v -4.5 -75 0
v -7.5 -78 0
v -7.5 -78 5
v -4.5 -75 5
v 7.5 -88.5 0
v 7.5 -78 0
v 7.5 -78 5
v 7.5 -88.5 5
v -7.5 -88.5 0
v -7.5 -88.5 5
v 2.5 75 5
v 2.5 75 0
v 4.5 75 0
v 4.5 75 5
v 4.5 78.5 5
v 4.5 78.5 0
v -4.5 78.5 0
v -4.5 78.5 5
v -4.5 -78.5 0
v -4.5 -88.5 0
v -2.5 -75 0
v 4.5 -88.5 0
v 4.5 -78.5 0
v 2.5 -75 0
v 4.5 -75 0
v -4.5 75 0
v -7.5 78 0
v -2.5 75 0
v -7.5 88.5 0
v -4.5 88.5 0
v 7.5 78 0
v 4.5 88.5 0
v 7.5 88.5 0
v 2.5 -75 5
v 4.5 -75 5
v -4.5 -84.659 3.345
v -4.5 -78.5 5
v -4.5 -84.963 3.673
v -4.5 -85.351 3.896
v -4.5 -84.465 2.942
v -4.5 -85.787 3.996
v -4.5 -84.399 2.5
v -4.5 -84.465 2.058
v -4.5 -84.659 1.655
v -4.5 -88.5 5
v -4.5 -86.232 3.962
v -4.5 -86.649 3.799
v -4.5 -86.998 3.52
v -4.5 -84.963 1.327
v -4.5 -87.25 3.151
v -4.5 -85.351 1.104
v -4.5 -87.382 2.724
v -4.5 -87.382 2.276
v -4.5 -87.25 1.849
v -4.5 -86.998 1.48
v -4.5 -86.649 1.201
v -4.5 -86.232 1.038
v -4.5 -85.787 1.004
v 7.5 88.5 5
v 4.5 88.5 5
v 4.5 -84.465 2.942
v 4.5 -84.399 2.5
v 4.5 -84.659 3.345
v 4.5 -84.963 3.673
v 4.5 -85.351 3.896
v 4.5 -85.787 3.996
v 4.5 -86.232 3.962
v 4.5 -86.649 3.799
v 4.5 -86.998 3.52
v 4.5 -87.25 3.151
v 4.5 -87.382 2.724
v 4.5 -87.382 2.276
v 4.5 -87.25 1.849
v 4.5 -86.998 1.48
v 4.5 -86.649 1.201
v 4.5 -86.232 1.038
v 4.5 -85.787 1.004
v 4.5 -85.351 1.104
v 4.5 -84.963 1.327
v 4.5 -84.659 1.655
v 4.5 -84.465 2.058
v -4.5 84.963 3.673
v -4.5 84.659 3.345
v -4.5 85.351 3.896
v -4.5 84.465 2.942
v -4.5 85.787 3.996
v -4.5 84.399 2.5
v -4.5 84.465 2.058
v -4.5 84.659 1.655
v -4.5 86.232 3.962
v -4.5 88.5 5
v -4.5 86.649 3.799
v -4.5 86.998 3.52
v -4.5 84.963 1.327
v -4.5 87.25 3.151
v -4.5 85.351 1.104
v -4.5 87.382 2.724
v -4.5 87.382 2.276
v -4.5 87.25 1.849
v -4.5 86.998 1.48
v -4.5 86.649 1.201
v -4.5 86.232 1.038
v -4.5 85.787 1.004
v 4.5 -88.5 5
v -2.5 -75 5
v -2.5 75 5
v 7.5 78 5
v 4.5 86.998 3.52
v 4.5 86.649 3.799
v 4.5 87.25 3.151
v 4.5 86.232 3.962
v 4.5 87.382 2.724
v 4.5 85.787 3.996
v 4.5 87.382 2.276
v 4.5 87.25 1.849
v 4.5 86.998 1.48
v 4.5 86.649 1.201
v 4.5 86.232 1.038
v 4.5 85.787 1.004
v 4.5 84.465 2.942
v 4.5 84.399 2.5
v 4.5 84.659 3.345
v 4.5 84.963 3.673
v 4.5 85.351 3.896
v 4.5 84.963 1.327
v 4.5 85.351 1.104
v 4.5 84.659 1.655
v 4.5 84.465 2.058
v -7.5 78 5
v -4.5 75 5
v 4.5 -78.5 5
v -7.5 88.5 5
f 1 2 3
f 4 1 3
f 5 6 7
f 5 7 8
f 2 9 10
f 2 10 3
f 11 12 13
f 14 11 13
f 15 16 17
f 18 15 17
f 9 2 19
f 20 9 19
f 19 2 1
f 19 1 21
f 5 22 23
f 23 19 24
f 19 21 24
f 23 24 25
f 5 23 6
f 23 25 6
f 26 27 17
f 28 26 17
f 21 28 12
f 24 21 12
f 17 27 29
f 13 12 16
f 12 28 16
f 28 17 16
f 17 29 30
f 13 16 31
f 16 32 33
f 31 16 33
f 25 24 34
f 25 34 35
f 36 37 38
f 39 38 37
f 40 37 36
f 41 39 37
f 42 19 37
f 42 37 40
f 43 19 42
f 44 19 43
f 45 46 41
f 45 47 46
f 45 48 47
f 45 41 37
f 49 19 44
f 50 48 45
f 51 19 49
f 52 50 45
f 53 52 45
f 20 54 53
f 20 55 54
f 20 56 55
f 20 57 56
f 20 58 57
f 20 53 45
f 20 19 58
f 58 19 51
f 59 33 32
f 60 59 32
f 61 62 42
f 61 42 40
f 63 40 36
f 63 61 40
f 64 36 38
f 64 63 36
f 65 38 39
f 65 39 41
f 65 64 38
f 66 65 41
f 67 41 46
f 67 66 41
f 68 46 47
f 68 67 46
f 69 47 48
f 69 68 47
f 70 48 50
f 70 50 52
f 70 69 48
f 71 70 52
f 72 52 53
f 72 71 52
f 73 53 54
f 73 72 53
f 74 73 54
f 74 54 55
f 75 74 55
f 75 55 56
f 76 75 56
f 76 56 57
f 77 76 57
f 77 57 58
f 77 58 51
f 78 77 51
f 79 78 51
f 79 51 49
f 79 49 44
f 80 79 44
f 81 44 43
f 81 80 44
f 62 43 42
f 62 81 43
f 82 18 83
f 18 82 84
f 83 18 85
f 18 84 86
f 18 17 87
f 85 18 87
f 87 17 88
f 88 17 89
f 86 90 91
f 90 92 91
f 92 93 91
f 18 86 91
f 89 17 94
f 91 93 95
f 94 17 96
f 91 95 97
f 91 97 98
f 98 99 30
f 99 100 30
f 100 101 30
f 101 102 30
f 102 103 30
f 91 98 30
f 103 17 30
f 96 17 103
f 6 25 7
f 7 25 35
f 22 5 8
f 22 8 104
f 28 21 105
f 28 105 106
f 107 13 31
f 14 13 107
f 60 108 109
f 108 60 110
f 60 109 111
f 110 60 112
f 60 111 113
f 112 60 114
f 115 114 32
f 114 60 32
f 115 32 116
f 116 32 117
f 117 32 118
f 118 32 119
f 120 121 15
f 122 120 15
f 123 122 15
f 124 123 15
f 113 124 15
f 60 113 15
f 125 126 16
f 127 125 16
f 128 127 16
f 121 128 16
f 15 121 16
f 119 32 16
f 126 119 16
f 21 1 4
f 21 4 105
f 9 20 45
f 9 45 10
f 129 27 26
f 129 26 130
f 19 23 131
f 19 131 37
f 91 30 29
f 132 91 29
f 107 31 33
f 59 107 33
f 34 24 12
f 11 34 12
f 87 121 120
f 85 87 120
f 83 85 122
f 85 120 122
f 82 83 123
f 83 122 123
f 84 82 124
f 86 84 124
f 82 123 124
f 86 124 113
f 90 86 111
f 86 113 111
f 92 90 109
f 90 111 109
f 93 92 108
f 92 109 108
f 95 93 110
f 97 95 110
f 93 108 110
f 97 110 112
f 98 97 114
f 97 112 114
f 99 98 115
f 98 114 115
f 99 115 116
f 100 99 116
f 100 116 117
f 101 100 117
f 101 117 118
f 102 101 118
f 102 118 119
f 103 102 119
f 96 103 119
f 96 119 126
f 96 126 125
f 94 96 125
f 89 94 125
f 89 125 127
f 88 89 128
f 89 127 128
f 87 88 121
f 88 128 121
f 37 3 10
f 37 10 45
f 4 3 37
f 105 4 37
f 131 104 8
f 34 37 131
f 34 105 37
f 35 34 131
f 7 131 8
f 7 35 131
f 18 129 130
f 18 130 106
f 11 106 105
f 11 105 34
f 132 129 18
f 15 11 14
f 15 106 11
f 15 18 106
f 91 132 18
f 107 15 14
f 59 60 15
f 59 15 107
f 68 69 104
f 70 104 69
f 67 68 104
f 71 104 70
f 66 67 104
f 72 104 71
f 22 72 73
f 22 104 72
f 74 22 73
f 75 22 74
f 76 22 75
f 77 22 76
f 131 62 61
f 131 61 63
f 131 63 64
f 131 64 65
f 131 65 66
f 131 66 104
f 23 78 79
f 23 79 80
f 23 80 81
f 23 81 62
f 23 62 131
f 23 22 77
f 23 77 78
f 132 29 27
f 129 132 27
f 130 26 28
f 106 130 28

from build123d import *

# Parameters (mm, degrees)
F0_W     = 5
F0_H     = 150
F1_DEPTH = 5
F2_R     = 1.5
F3_DEPTH = 9
F5_SIZE  = 3


with BuildPart() as f1:
    # F0 (on Top) → F1 (new body)
    with BuildSketch(Plane.XY):
        Rectangle(F0_W, F0_H)
        Polygon((-2.5, 75), (2.5, 75), (7.5, 75), (7.5, 88.5), (4.5, 88.5), (4.5, 78.5), (0, 78.5), (-4.5, 78.5), (-4.5, 88.5), (-7.5, 88.5), (-7.5, 75), align=None)
    extrude(amount=F1_DEPTH)

    # F2 (on face) → F3 (join, through all)
    with BuildSketch(Plane(origin=(4.5, 0, 0), x_dir=(0, -1, 0), z_dir=(-1, 0, 0))):
        with Locations((-85.8986780643, 2.5)):
            Circle(F2_R)
    extrude(amount=F3_DEPTH)

    # F4: F1 across plane


with BuildPart() as f1_1:
    add(f1.part)
    add(f1.part.mirror(Plane.XZ))

    # F5
    f5_edges = [f1_1.edges().sort_by_distance(p)[0] for p in [
        (-7.5, 75, 2.5),
        (7.5, 75, 2.5),
        (-7.5, -75, 2.5),
        (7.5, -75, 2.5),
    ]]
    chamfer(f5_edges, length=F5_SIZE)


solid = f1_1.part
